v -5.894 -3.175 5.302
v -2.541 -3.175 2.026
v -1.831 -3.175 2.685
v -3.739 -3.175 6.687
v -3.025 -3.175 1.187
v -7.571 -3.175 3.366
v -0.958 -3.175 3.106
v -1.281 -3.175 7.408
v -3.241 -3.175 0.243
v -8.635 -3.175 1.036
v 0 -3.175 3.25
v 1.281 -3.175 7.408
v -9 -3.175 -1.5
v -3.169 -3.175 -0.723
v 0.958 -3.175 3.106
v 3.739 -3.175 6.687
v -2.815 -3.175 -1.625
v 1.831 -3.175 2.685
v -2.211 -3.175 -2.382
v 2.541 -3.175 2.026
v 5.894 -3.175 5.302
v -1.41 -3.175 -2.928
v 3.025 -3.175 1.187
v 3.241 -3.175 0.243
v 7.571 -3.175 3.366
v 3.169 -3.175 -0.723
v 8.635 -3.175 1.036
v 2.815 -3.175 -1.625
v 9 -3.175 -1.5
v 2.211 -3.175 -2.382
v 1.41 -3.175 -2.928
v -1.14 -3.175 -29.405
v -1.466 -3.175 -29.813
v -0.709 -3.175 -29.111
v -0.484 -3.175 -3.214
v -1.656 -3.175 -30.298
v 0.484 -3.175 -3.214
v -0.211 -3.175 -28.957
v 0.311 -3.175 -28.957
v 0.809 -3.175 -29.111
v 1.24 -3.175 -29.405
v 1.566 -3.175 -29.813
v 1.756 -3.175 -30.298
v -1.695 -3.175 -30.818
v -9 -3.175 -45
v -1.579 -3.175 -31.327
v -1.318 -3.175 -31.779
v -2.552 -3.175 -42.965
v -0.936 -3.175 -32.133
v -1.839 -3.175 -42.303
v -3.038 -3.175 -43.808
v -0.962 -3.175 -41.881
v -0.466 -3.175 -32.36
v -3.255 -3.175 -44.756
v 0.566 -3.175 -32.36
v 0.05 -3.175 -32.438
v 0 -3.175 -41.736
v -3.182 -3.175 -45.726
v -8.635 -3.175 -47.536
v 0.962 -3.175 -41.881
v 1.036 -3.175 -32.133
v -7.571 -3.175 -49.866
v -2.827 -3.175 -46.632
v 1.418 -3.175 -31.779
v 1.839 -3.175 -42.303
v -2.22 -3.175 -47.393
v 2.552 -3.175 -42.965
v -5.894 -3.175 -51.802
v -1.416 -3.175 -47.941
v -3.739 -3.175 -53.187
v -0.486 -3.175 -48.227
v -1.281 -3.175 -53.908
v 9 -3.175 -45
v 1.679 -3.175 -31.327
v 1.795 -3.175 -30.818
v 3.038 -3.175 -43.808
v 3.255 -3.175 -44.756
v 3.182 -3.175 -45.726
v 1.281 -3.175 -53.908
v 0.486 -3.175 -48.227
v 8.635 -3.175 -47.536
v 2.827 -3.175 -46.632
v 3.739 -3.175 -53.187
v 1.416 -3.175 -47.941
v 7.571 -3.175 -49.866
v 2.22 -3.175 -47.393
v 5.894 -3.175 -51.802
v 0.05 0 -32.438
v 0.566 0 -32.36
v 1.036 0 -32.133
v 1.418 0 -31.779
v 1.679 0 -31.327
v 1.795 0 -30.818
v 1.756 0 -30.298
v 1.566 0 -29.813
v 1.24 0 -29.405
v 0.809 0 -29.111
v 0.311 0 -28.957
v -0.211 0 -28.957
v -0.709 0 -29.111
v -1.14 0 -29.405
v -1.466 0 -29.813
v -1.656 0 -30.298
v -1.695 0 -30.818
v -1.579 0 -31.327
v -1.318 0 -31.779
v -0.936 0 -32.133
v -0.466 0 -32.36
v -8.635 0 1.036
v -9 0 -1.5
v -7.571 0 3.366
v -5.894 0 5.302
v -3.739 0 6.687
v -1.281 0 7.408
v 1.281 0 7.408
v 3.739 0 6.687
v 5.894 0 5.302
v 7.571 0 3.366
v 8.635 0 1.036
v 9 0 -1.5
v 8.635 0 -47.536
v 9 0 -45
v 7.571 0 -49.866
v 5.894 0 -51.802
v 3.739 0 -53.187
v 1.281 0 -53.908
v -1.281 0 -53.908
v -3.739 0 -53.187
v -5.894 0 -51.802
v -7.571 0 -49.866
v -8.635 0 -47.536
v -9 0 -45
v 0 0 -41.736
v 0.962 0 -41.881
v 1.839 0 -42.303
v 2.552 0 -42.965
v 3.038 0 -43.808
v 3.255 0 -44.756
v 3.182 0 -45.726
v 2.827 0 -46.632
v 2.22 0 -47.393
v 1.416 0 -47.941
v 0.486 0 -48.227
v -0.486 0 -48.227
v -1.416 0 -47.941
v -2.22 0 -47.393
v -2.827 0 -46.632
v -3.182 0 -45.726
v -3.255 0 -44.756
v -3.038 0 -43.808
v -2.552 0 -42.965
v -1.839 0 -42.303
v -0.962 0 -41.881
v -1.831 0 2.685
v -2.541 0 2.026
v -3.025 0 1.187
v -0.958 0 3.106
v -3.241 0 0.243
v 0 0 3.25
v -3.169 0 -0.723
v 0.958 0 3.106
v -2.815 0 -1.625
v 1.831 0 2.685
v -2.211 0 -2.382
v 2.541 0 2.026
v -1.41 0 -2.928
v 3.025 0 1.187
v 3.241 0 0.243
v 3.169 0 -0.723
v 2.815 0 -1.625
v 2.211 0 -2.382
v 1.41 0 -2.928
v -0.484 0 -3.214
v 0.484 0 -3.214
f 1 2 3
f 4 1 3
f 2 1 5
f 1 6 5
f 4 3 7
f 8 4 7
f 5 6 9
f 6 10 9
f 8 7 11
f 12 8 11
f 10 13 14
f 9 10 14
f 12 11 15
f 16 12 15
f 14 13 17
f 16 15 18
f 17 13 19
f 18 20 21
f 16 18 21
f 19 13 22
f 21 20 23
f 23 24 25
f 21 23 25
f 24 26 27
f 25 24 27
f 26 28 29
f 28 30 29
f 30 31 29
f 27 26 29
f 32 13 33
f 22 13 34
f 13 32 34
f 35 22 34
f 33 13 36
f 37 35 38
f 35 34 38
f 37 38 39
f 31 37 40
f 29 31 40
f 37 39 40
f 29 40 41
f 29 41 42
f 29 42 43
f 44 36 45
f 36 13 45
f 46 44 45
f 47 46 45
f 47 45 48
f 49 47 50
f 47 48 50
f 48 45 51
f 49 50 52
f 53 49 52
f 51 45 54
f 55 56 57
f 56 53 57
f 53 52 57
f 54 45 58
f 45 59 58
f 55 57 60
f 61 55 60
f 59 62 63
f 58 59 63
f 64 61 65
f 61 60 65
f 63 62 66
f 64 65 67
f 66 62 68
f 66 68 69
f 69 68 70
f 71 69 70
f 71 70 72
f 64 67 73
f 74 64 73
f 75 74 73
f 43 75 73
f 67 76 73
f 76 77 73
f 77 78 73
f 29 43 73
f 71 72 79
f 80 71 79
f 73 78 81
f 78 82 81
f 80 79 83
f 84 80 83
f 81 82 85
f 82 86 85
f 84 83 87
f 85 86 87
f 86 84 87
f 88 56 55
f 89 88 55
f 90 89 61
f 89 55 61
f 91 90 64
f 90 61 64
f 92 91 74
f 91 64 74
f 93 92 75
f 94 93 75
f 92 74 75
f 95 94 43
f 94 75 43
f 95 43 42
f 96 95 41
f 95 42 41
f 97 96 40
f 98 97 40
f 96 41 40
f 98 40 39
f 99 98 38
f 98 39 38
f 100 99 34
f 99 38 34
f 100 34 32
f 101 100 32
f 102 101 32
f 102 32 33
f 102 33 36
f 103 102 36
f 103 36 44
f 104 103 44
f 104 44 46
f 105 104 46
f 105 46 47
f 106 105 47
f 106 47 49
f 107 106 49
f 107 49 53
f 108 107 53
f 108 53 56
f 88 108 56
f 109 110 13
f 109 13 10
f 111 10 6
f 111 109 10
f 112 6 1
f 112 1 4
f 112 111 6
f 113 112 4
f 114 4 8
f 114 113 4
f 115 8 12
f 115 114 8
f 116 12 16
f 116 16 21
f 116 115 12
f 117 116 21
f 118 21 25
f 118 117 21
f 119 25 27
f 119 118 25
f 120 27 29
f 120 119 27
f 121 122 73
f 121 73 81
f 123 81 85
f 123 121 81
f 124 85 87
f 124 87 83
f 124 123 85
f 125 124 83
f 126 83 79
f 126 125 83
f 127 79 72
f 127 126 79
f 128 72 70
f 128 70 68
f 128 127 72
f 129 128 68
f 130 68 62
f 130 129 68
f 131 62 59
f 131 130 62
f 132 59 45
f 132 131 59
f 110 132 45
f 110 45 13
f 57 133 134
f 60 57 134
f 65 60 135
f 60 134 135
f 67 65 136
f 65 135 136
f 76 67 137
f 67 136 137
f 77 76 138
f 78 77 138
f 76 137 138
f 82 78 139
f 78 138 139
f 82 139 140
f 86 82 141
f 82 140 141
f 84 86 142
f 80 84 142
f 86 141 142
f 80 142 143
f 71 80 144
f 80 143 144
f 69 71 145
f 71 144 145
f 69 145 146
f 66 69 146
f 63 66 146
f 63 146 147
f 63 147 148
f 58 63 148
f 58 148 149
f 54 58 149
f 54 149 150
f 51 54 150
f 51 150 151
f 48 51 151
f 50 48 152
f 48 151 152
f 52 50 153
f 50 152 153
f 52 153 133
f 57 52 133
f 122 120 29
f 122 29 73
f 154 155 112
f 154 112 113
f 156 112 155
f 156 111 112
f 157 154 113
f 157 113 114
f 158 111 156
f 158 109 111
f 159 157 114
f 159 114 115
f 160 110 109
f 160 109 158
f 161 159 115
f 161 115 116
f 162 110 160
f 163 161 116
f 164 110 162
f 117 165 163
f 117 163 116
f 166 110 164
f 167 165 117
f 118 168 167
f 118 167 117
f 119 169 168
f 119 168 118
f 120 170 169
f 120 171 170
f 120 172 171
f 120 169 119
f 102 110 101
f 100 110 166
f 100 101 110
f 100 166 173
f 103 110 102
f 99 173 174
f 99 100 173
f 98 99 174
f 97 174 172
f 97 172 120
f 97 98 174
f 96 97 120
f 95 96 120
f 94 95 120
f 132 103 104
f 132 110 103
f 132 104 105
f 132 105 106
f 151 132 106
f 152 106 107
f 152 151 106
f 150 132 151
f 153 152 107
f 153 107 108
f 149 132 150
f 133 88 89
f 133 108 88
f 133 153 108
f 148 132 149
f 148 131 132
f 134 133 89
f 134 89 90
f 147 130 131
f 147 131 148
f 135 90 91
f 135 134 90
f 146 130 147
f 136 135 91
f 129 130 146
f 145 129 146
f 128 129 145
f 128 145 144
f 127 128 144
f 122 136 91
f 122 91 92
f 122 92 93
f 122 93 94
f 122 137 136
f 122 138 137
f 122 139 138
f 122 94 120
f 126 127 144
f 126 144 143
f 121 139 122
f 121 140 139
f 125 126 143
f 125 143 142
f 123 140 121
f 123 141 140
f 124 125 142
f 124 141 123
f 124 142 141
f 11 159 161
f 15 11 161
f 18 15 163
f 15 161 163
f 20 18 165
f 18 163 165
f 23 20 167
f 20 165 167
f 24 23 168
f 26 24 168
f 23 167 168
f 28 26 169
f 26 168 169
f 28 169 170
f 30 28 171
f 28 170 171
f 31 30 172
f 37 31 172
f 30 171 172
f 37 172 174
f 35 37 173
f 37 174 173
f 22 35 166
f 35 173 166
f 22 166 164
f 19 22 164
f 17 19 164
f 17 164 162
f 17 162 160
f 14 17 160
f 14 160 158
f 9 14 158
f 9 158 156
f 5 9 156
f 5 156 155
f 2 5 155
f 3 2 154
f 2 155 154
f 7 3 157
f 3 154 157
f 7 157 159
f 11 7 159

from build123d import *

# Parameters (mm, degrees)
SKETCH1_R          = 3.25
SKETCH1_R_2        = 3.2639
BASE_FLANGE1_DEPTH = 3.175
CUT_EXTRUDE1_REACH = 56.837
SKETCH2_R          = 1.75


# Sheet-metal steps are written as plain solids
with BuildPart() as part:
    # Sketch1 → Base-Flange1 (new body)
    with BuildSketch(Plane(origin=(0, 0, 0), x_dir=(1, 0, 0), z_dir=(0, 1, 0))):
        with BuildLine():
            Line((9, 1.5), (9, 45))
            ThreePointArc((9, 45), (0, 54), (-9, 45))
            Line((-9, 45), (-9, 1.5))
            ThreePointArc((-9, 1.5), (0, -7.5), (9, 1.5))
        make_face()
        with Locations(Location((0, 0, 0), (0, 0, 270))):
            Circle(SKETCH1_R, mode=Mode.SUBTRACT)
        with Locations(Location((0, 45, 0), (0, 0, 270))):
            Circle(SKETCH1_R_2, mode=Mode.SUBTRACT)
    extrude(amount=-BASE_FLANGE1_DEPTH)

    # Sketch2 → Cut-Extrude1 (cut, up to next)
    with BuildSketch(Plane.XZ.offset(3.175), mode=Mode.PRIVATE) as cut_extrude1_sk1:
        with Locations(Location((0.05, -30.687503986, 0), (0, 0, 270))):
            Circle(SKETCH2_R)
    cut_extrude1_tool1 = extrude(cut_extrude1_sk1.sketch, amount=-CUT_EXTRUDE1_REACH, mode=Mode.PRIVATE) & part.part
    add(cut_extrude1_tool1.solids().sort_by_distance((0.05, -3.175, -30.687504))[0], mode=Mode.SUBTRACT)


solid = part.part
